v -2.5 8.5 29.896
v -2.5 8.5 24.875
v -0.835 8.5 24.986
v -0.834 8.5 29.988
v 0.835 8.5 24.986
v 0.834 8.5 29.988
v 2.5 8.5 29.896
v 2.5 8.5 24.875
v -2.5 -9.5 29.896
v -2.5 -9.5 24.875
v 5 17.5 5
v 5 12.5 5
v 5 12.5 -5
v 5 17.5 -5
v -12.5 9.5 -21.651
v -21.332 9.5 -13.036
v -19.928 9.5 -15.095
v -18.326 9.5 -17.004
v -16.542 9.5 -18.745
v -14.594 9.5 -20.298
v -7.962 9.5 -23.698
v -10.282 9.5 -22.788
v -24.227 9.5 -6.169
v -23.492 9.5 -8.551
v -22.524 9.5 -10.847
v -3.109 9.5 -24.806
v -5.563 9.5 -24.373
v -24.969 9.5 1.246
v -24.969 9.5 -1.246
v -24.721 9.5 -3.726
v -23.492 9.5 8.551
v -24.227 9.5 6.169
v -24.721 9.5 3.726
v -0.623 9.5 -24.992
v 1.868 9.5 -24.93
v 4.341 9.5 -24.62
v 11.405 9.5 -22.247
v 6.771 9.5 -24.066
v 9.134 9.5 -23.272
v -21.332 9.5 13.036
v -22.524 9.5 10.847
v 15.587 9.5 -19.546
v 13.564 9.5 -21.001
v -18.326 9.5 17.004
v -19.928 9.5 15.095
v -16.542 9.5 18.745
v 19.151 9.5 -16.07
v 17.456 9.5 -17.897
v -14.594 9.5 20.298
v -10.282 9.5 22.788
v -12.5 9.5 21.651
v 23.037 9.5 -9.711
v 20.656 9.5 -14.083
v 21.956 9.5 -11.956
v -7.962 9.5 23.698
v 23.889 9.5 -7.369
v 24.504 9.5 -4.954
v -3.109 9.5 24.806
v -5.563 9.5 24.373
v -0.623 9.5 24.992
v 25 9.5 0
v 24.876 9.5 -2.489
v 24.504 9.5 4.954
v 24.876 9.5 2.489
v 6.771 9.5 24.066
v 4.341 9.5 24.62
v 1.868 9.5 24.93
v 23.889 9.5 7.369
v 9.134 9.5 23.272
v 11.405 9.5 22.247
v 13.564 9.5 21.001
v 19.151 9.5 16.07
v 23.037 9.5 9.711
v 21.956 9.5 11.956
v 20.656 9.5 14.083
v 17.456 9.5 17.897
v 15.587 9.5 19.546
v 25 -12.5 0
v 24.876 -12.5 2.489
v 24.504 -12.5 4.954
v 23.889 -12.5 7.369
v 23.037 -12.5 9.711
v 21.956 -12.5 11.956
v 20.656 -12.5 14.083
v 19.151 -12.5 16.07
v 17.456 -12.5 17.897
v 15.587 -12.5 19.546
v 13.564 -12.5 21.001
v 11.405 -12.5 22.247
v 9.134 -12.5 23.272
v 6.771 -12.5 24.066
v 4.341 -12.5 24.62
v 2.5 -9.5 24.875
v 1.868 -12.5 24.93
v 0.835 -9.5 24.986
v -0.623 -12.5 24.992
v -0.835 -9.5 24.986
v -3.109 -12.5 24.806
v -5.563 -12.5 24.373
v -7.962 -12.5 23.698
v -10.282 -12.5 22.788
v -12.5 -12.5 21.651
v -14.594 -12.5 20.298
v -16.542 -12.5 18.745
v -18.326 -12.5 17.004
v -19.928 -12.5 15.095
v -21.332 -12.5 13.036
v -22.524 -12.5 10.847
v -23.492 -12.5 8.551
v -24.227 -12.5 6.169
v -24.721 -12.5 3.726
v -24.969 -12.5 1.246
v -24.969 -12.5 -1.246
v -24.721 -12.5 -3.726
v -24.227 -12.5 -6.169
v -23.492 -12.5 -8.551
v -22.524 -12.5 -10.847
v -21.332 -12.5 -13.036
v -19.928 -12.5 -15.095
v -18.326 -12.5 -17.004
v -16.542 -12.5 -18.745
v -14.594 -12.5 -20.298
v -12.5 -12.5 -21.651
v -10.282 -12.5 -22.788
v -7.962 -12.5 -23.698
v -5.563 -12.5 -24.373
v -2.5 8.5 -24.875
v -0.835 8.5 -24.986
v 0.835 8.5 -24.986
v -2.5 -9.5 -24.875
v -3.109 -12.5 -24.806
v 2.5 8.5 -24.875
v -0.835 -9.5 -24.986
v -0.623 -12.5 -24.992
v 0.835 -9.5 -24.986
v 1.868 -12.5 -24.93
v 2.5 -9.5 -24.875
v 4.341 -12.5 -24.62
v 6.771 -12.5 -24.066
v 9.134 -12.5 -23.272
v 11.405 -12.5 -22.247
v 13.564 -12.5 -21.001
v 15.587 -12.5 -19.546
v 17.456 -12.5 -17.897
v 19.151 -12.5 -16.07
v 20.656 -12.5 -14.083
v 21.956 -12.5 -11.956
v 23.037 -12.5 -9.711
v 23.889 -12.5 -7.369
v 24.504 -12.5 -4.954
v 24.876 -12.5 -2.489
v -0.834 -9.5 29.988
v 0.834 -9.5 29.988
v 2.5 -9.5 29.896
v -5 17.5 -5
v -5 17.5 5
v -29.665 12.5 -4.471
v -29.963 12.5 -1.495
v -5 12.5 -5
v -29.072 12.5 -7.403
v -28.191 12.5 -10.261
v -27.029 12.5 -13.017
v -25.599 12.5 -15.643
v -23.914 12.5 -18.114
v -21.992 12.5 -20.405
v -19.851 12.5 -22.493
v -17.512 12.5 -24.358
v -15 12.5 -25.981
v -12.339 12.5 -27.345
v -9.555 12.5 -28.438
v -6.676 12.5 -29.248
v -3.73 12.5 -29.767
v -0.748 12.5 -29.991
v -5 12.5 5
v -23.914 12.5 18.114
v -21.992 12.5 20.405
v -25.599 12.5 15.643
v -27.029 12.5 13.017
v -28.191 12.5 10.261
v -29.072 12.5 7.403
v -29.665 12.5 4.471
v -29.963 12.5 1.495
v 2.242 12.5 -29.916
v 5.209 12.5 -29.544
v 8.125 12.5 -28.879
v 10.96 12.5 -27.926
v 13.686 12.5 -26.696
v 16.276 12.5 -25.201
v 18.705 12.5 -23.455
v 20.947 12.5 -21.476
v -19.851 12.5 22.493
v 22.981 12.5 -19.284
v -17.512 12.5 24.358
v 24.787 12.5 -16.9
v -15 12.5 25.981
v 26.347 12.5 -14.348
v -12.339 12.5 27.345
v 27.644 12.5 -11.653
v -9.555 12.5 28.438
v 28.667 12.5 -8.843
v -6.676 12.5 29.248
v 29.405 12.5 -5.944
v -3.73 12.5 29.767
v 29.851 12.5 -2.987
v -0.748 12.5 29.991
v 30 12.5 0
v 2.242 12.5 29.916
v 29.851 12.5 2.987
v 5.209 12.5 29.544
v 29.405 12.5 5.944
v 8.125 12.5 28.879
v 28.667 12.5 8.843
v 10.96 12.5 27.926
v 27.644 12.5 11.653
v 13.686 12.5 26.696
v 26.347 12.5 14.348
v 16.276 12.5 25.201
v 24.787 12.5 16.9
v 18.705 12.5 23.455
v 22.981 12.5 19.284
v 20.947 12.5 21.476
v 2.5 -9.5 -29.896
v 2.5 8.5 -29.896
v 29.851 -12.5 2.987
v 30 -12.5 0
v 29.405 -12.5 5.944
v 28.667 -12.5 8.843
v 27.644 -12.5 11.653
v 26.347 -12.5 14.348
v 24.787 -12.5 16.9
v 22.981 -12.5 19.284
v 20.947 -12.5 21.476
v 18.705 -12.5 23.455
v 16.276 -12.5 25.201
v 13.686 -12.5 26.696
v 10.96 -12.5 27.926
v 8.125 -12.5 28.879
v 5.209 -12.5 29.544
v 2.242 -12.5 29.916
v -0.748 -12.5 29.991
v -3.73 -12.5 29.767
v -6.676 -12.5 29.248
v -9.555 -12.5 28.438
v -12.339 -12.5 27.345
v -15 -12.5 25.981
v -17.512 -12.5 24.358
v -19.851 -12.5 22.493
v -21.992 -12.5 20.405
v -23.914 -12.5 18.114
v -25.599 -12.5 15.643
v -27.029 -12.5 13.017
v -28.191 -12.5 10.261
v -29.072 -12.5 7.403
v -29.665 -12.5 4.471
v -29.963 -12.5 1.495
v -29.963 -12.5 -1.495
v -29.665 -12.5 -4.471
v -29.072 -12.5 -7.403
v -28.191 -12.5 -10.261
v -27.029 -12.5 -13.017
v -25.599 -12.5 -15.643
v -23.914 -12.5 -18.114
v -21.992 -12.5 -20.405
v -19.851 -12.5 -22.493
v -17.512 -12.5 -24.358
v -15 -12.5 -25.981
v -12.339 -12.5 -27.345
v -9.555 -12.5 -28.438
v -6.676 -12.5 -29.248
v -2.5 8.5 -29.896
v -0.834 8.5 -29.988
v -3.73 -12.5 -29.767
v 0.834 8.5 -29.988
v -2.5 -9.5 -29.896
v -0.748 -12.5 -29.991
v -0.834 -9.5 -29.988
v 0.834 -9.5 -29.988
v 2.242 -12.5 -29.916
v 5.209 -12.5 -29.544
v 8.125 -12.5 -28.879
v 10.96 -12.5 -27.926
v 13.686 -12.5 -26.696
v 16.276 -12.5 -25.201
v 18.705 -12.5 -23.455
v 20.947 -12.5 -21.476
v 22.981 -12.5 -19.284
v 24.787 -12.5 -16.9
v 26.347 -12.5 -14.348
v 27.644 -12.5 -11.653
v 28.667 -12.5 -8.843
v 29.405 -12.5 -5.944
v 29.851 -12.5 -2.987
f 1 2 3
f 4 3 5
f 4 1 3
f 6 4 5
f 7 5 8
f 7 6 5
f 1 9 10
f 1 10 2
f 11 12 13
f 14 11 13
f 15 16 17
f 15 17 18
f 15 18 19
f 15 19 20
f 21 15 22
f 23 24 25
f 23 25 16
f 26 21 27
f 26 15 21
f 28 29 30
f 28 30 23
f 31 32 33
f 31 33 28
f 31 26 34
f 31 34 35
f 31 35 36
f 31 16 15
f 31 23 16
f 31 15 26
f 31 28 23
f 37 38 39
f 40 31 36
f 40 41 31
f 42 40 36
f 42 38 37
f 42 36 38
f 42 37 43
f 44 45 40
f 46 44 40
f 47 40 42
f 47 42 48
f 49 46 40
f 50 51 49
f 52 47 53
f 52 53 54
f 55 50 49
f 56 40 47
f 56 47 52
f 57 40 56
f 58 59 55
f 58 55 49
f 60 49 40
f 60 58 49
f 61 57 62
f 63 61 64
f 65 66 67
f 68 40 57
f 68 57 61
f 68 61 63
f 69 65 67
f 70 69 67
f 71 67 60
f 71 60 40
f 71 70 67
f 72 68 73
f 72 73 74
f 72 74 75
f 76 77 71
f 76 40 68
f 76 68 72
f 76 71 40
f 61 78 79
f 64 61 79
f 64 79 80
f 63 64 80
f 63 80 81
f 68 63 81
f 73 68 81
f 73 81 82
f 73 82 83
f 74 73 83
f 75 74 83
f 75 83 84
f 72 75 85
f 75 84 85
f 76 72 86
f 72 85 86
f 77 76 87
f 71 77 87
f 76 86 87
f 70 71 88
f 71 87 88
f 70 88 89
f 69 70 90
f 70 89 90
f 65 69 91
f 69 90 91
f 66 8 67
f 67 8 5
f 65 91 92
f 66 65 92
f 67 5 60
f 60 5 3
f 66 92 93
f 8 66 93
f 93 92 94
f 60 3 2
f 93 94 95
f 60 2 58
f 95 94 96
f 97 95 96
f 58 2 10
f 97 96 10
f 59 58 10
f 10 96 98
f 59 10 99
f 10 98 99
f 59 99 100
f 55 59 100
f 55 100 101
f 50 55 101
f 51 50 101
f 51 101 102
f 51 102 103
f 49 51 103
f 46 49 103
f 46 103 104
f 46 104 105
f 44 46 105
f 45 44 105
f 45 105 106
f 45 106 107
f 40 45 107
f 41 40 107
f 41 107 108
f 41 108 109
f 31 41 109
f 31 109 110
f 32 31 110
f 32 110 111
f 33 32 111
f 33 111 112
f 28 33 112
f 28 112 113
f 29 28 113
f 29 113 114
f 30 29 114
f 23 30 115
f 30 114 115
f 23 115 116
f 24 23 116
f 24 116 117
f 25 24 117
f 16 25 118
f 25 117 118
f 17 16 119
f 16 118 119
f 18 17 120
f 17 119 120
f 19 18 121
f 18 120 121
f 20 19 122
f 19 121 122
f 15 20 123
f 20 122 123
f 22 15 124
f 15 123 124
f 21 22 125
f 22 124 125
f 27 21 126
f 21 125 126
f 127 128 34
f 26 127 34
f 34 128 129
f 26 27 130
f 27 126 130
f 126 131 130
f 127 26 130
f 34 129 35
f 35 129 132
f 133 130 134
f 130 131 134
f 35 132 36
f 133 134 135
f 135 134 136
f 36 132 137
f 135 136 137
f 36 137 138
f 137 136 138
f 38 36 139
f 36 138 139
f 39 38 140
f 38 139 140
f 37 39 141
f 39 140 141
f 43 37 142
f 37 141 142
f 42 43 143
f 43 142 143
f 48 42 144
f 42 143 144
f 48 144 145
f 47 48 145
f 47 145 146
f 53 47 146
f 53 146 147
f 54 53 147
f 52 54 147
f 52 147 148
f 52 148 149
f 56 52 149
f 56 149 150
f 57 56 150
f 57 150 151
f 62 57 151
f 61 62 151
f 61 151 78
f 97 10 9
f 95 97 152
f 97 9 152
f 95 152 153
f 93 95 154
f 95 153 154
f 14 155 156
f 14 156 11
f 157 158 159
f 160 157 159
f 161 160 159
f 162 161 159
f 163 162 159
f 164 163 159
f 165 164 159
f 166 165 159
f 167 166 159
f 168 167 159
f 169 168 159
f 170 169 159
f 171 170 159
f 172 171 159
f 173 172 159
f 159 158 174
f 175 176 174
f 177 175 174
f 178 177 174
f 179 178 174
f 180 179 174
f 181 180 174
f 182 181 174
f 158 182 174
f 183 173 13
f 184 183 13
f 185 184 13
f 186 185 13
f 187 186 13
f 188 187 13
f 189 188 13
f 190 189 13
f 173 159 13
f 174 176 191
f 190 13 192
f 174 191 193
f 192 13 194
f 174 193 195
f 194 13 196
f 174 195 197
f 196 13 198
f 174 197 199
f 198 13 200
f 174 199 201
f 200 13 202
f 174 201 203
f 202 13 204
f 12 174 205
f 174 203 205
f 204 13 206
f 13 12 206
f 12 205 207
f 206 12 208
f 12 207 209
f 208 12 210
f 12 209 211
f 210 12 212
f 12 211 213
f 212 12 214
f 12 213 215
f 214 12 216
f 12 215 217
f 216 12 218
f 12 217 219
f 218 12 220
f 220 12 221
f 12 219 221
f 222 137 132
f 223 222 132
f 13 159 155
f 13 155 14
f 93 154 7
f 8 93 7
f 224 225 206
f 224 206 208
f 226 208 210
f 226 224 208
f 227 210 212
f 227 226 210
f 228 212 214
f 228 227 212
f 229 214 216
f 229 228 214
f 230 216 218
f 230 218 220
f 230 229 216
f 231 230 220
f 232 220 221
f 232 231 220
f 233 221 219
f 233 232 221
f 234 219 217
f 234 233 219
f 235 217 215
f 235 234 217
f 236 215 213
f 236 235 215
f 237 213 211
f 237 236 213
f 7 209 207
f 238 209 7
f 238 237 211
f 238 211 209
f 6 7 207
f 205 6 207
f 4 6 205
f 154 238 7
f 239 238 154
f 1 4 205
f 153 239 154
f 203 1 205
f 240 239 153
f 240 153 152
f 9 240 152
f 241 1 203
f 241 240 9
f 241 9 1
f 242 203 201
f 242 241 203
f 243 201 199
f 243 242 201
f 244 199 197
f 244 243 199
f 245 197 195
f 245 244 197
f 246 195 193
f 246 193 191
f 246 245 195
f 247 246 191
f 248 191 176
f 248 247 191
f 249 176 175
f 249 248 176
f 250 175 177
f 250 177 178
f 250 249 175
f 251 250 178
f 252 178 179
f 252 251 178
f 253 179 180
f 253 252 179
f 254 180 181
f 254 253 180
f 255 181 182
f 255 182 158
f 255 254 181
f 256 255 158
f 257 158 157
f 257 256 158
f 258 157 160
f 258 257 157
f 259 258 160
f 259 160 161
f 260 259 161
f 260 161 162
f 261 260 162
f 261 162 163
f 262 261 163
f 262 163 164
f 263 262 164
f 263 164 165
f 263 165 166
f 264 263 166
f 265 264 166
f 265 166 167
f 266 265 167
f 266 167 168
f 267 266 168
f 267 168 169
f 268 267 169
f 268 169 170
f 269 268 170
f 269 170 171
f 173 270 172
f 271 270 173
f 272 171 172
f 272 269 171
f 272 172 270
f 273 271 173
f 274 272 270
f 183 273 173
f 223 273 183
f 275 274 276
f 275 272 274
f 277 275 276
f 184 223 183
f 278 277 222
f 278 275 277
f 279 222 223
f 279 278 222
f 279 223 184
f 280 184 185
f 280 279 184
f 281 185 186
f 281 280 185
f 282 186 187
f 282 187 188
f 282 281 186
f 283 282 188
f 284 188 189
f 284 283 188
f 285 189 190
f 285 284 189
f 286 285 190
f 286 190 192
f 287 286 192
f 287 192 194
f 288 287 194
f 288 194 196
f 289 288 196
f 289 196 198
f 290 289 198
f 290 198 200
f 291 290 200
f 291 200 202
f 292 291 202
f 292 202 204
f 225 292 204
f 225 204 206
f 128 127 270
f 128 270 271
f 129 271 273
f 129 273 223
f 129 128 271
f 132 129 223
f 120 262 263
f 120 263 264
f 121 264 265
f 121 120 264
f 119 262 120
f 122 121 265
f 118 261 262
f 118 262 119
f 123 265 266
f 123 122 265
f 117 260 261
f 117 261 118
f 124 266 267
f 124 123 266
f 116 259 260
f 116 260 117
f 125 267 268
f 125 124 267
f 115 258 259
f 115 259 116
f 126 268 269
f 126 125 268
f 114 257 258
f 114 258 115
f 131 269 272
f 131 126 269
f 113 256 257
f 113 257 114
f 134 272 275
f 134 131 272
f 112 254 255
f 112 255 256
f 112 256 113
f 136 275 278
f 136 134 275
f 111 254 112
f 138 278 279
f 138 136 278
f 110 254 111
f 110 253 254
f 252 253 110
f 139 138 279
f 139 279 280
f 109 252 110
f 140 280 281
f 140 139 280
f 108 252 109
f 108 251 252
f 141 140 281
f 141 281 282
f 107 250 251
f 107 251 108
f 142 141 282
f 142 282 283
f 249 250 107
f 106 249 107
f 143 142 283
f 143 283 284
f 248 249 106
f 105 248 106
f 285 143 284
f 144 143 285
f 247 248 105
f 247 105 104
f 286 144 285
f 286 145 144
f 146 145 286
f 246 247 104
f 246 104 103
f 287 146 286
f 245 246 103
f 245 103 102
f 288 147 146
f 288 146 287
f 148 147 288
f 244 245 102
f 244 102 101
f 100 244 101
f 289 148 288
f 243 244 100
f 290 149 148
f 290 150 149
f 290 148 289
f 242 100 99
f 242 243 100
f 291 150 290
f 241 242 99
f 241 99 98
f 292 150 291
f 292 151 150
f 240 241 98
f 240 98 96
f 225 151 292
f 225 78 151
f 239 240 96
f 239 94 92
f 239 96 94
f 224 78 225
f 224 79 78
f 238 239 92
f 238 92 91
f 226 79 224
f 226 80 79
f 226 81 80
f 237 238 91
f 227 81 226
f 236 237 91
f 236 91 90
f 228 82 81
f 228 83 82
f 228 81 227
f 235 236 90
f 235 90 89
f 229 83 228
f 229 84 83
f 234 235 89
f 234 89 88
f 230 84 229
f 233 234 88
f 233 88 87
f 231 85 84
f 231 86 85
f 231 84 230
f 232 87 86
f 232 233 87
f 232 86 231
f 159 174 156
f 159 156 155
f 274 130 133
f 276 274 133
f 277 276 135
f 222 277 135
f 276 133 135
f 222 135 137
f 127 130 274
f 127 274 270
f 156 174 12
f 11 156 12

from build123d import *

# Parameters (mm, degrees)
SKETCH003_W  = 5
SKETCH003_H  = 18
PAD002_DEPTH = 37.5
SKETCH_R     = 30
PAD_DEPTH    = 12.5
SKETCH001_R  = 25
POCKET_DEPTH = 22
SKETCH002_W  = 10
SKETCH002_H  = 10
PAD001_DEPTH = 5


with BuildPart() as pad002:
    # Sketch003 → Pad002 (new body, symmetric)
    with BuildSketch(Plane.XY):
        with Locations((0, -0.5)):
            Rectangle(SKETCH003_W, SKETCH003_H)
    extrude(amount=PAD002_DEPTH, both=True)


with BuildPart() as cut:
    # Sketch → Pad (new body, symmetric)
    with BuildSketch(Plane.XZ):
        Circle(SKETCH_R)
    extrude(amount=PAD_DEPTH, both=True)

    # Sketch001 → Pocket (cut)
    with BuildSketch(Plane.XZ.offset(12.5)):
        Circle(SKETCH001_R)
    extrude(amount=-POCKET_DEPTH, mode=Mode.SUBTRACT)

    # Sketch002 → Pad001 (new body)
    with BuildSketch(Plane(origin=(0, 12.5, 0), x_dir=(1, 0, 0), z_dir=(0, 1, 0))):
        Rectangle(SKETCH002_W, SKETCH002_H)
    extrude(amount=PAD001_DEPTH)

    # Cut: cut Pad002
    add(pad002.part, mode=Mode.SUBTRACT)


solid = cut.part
